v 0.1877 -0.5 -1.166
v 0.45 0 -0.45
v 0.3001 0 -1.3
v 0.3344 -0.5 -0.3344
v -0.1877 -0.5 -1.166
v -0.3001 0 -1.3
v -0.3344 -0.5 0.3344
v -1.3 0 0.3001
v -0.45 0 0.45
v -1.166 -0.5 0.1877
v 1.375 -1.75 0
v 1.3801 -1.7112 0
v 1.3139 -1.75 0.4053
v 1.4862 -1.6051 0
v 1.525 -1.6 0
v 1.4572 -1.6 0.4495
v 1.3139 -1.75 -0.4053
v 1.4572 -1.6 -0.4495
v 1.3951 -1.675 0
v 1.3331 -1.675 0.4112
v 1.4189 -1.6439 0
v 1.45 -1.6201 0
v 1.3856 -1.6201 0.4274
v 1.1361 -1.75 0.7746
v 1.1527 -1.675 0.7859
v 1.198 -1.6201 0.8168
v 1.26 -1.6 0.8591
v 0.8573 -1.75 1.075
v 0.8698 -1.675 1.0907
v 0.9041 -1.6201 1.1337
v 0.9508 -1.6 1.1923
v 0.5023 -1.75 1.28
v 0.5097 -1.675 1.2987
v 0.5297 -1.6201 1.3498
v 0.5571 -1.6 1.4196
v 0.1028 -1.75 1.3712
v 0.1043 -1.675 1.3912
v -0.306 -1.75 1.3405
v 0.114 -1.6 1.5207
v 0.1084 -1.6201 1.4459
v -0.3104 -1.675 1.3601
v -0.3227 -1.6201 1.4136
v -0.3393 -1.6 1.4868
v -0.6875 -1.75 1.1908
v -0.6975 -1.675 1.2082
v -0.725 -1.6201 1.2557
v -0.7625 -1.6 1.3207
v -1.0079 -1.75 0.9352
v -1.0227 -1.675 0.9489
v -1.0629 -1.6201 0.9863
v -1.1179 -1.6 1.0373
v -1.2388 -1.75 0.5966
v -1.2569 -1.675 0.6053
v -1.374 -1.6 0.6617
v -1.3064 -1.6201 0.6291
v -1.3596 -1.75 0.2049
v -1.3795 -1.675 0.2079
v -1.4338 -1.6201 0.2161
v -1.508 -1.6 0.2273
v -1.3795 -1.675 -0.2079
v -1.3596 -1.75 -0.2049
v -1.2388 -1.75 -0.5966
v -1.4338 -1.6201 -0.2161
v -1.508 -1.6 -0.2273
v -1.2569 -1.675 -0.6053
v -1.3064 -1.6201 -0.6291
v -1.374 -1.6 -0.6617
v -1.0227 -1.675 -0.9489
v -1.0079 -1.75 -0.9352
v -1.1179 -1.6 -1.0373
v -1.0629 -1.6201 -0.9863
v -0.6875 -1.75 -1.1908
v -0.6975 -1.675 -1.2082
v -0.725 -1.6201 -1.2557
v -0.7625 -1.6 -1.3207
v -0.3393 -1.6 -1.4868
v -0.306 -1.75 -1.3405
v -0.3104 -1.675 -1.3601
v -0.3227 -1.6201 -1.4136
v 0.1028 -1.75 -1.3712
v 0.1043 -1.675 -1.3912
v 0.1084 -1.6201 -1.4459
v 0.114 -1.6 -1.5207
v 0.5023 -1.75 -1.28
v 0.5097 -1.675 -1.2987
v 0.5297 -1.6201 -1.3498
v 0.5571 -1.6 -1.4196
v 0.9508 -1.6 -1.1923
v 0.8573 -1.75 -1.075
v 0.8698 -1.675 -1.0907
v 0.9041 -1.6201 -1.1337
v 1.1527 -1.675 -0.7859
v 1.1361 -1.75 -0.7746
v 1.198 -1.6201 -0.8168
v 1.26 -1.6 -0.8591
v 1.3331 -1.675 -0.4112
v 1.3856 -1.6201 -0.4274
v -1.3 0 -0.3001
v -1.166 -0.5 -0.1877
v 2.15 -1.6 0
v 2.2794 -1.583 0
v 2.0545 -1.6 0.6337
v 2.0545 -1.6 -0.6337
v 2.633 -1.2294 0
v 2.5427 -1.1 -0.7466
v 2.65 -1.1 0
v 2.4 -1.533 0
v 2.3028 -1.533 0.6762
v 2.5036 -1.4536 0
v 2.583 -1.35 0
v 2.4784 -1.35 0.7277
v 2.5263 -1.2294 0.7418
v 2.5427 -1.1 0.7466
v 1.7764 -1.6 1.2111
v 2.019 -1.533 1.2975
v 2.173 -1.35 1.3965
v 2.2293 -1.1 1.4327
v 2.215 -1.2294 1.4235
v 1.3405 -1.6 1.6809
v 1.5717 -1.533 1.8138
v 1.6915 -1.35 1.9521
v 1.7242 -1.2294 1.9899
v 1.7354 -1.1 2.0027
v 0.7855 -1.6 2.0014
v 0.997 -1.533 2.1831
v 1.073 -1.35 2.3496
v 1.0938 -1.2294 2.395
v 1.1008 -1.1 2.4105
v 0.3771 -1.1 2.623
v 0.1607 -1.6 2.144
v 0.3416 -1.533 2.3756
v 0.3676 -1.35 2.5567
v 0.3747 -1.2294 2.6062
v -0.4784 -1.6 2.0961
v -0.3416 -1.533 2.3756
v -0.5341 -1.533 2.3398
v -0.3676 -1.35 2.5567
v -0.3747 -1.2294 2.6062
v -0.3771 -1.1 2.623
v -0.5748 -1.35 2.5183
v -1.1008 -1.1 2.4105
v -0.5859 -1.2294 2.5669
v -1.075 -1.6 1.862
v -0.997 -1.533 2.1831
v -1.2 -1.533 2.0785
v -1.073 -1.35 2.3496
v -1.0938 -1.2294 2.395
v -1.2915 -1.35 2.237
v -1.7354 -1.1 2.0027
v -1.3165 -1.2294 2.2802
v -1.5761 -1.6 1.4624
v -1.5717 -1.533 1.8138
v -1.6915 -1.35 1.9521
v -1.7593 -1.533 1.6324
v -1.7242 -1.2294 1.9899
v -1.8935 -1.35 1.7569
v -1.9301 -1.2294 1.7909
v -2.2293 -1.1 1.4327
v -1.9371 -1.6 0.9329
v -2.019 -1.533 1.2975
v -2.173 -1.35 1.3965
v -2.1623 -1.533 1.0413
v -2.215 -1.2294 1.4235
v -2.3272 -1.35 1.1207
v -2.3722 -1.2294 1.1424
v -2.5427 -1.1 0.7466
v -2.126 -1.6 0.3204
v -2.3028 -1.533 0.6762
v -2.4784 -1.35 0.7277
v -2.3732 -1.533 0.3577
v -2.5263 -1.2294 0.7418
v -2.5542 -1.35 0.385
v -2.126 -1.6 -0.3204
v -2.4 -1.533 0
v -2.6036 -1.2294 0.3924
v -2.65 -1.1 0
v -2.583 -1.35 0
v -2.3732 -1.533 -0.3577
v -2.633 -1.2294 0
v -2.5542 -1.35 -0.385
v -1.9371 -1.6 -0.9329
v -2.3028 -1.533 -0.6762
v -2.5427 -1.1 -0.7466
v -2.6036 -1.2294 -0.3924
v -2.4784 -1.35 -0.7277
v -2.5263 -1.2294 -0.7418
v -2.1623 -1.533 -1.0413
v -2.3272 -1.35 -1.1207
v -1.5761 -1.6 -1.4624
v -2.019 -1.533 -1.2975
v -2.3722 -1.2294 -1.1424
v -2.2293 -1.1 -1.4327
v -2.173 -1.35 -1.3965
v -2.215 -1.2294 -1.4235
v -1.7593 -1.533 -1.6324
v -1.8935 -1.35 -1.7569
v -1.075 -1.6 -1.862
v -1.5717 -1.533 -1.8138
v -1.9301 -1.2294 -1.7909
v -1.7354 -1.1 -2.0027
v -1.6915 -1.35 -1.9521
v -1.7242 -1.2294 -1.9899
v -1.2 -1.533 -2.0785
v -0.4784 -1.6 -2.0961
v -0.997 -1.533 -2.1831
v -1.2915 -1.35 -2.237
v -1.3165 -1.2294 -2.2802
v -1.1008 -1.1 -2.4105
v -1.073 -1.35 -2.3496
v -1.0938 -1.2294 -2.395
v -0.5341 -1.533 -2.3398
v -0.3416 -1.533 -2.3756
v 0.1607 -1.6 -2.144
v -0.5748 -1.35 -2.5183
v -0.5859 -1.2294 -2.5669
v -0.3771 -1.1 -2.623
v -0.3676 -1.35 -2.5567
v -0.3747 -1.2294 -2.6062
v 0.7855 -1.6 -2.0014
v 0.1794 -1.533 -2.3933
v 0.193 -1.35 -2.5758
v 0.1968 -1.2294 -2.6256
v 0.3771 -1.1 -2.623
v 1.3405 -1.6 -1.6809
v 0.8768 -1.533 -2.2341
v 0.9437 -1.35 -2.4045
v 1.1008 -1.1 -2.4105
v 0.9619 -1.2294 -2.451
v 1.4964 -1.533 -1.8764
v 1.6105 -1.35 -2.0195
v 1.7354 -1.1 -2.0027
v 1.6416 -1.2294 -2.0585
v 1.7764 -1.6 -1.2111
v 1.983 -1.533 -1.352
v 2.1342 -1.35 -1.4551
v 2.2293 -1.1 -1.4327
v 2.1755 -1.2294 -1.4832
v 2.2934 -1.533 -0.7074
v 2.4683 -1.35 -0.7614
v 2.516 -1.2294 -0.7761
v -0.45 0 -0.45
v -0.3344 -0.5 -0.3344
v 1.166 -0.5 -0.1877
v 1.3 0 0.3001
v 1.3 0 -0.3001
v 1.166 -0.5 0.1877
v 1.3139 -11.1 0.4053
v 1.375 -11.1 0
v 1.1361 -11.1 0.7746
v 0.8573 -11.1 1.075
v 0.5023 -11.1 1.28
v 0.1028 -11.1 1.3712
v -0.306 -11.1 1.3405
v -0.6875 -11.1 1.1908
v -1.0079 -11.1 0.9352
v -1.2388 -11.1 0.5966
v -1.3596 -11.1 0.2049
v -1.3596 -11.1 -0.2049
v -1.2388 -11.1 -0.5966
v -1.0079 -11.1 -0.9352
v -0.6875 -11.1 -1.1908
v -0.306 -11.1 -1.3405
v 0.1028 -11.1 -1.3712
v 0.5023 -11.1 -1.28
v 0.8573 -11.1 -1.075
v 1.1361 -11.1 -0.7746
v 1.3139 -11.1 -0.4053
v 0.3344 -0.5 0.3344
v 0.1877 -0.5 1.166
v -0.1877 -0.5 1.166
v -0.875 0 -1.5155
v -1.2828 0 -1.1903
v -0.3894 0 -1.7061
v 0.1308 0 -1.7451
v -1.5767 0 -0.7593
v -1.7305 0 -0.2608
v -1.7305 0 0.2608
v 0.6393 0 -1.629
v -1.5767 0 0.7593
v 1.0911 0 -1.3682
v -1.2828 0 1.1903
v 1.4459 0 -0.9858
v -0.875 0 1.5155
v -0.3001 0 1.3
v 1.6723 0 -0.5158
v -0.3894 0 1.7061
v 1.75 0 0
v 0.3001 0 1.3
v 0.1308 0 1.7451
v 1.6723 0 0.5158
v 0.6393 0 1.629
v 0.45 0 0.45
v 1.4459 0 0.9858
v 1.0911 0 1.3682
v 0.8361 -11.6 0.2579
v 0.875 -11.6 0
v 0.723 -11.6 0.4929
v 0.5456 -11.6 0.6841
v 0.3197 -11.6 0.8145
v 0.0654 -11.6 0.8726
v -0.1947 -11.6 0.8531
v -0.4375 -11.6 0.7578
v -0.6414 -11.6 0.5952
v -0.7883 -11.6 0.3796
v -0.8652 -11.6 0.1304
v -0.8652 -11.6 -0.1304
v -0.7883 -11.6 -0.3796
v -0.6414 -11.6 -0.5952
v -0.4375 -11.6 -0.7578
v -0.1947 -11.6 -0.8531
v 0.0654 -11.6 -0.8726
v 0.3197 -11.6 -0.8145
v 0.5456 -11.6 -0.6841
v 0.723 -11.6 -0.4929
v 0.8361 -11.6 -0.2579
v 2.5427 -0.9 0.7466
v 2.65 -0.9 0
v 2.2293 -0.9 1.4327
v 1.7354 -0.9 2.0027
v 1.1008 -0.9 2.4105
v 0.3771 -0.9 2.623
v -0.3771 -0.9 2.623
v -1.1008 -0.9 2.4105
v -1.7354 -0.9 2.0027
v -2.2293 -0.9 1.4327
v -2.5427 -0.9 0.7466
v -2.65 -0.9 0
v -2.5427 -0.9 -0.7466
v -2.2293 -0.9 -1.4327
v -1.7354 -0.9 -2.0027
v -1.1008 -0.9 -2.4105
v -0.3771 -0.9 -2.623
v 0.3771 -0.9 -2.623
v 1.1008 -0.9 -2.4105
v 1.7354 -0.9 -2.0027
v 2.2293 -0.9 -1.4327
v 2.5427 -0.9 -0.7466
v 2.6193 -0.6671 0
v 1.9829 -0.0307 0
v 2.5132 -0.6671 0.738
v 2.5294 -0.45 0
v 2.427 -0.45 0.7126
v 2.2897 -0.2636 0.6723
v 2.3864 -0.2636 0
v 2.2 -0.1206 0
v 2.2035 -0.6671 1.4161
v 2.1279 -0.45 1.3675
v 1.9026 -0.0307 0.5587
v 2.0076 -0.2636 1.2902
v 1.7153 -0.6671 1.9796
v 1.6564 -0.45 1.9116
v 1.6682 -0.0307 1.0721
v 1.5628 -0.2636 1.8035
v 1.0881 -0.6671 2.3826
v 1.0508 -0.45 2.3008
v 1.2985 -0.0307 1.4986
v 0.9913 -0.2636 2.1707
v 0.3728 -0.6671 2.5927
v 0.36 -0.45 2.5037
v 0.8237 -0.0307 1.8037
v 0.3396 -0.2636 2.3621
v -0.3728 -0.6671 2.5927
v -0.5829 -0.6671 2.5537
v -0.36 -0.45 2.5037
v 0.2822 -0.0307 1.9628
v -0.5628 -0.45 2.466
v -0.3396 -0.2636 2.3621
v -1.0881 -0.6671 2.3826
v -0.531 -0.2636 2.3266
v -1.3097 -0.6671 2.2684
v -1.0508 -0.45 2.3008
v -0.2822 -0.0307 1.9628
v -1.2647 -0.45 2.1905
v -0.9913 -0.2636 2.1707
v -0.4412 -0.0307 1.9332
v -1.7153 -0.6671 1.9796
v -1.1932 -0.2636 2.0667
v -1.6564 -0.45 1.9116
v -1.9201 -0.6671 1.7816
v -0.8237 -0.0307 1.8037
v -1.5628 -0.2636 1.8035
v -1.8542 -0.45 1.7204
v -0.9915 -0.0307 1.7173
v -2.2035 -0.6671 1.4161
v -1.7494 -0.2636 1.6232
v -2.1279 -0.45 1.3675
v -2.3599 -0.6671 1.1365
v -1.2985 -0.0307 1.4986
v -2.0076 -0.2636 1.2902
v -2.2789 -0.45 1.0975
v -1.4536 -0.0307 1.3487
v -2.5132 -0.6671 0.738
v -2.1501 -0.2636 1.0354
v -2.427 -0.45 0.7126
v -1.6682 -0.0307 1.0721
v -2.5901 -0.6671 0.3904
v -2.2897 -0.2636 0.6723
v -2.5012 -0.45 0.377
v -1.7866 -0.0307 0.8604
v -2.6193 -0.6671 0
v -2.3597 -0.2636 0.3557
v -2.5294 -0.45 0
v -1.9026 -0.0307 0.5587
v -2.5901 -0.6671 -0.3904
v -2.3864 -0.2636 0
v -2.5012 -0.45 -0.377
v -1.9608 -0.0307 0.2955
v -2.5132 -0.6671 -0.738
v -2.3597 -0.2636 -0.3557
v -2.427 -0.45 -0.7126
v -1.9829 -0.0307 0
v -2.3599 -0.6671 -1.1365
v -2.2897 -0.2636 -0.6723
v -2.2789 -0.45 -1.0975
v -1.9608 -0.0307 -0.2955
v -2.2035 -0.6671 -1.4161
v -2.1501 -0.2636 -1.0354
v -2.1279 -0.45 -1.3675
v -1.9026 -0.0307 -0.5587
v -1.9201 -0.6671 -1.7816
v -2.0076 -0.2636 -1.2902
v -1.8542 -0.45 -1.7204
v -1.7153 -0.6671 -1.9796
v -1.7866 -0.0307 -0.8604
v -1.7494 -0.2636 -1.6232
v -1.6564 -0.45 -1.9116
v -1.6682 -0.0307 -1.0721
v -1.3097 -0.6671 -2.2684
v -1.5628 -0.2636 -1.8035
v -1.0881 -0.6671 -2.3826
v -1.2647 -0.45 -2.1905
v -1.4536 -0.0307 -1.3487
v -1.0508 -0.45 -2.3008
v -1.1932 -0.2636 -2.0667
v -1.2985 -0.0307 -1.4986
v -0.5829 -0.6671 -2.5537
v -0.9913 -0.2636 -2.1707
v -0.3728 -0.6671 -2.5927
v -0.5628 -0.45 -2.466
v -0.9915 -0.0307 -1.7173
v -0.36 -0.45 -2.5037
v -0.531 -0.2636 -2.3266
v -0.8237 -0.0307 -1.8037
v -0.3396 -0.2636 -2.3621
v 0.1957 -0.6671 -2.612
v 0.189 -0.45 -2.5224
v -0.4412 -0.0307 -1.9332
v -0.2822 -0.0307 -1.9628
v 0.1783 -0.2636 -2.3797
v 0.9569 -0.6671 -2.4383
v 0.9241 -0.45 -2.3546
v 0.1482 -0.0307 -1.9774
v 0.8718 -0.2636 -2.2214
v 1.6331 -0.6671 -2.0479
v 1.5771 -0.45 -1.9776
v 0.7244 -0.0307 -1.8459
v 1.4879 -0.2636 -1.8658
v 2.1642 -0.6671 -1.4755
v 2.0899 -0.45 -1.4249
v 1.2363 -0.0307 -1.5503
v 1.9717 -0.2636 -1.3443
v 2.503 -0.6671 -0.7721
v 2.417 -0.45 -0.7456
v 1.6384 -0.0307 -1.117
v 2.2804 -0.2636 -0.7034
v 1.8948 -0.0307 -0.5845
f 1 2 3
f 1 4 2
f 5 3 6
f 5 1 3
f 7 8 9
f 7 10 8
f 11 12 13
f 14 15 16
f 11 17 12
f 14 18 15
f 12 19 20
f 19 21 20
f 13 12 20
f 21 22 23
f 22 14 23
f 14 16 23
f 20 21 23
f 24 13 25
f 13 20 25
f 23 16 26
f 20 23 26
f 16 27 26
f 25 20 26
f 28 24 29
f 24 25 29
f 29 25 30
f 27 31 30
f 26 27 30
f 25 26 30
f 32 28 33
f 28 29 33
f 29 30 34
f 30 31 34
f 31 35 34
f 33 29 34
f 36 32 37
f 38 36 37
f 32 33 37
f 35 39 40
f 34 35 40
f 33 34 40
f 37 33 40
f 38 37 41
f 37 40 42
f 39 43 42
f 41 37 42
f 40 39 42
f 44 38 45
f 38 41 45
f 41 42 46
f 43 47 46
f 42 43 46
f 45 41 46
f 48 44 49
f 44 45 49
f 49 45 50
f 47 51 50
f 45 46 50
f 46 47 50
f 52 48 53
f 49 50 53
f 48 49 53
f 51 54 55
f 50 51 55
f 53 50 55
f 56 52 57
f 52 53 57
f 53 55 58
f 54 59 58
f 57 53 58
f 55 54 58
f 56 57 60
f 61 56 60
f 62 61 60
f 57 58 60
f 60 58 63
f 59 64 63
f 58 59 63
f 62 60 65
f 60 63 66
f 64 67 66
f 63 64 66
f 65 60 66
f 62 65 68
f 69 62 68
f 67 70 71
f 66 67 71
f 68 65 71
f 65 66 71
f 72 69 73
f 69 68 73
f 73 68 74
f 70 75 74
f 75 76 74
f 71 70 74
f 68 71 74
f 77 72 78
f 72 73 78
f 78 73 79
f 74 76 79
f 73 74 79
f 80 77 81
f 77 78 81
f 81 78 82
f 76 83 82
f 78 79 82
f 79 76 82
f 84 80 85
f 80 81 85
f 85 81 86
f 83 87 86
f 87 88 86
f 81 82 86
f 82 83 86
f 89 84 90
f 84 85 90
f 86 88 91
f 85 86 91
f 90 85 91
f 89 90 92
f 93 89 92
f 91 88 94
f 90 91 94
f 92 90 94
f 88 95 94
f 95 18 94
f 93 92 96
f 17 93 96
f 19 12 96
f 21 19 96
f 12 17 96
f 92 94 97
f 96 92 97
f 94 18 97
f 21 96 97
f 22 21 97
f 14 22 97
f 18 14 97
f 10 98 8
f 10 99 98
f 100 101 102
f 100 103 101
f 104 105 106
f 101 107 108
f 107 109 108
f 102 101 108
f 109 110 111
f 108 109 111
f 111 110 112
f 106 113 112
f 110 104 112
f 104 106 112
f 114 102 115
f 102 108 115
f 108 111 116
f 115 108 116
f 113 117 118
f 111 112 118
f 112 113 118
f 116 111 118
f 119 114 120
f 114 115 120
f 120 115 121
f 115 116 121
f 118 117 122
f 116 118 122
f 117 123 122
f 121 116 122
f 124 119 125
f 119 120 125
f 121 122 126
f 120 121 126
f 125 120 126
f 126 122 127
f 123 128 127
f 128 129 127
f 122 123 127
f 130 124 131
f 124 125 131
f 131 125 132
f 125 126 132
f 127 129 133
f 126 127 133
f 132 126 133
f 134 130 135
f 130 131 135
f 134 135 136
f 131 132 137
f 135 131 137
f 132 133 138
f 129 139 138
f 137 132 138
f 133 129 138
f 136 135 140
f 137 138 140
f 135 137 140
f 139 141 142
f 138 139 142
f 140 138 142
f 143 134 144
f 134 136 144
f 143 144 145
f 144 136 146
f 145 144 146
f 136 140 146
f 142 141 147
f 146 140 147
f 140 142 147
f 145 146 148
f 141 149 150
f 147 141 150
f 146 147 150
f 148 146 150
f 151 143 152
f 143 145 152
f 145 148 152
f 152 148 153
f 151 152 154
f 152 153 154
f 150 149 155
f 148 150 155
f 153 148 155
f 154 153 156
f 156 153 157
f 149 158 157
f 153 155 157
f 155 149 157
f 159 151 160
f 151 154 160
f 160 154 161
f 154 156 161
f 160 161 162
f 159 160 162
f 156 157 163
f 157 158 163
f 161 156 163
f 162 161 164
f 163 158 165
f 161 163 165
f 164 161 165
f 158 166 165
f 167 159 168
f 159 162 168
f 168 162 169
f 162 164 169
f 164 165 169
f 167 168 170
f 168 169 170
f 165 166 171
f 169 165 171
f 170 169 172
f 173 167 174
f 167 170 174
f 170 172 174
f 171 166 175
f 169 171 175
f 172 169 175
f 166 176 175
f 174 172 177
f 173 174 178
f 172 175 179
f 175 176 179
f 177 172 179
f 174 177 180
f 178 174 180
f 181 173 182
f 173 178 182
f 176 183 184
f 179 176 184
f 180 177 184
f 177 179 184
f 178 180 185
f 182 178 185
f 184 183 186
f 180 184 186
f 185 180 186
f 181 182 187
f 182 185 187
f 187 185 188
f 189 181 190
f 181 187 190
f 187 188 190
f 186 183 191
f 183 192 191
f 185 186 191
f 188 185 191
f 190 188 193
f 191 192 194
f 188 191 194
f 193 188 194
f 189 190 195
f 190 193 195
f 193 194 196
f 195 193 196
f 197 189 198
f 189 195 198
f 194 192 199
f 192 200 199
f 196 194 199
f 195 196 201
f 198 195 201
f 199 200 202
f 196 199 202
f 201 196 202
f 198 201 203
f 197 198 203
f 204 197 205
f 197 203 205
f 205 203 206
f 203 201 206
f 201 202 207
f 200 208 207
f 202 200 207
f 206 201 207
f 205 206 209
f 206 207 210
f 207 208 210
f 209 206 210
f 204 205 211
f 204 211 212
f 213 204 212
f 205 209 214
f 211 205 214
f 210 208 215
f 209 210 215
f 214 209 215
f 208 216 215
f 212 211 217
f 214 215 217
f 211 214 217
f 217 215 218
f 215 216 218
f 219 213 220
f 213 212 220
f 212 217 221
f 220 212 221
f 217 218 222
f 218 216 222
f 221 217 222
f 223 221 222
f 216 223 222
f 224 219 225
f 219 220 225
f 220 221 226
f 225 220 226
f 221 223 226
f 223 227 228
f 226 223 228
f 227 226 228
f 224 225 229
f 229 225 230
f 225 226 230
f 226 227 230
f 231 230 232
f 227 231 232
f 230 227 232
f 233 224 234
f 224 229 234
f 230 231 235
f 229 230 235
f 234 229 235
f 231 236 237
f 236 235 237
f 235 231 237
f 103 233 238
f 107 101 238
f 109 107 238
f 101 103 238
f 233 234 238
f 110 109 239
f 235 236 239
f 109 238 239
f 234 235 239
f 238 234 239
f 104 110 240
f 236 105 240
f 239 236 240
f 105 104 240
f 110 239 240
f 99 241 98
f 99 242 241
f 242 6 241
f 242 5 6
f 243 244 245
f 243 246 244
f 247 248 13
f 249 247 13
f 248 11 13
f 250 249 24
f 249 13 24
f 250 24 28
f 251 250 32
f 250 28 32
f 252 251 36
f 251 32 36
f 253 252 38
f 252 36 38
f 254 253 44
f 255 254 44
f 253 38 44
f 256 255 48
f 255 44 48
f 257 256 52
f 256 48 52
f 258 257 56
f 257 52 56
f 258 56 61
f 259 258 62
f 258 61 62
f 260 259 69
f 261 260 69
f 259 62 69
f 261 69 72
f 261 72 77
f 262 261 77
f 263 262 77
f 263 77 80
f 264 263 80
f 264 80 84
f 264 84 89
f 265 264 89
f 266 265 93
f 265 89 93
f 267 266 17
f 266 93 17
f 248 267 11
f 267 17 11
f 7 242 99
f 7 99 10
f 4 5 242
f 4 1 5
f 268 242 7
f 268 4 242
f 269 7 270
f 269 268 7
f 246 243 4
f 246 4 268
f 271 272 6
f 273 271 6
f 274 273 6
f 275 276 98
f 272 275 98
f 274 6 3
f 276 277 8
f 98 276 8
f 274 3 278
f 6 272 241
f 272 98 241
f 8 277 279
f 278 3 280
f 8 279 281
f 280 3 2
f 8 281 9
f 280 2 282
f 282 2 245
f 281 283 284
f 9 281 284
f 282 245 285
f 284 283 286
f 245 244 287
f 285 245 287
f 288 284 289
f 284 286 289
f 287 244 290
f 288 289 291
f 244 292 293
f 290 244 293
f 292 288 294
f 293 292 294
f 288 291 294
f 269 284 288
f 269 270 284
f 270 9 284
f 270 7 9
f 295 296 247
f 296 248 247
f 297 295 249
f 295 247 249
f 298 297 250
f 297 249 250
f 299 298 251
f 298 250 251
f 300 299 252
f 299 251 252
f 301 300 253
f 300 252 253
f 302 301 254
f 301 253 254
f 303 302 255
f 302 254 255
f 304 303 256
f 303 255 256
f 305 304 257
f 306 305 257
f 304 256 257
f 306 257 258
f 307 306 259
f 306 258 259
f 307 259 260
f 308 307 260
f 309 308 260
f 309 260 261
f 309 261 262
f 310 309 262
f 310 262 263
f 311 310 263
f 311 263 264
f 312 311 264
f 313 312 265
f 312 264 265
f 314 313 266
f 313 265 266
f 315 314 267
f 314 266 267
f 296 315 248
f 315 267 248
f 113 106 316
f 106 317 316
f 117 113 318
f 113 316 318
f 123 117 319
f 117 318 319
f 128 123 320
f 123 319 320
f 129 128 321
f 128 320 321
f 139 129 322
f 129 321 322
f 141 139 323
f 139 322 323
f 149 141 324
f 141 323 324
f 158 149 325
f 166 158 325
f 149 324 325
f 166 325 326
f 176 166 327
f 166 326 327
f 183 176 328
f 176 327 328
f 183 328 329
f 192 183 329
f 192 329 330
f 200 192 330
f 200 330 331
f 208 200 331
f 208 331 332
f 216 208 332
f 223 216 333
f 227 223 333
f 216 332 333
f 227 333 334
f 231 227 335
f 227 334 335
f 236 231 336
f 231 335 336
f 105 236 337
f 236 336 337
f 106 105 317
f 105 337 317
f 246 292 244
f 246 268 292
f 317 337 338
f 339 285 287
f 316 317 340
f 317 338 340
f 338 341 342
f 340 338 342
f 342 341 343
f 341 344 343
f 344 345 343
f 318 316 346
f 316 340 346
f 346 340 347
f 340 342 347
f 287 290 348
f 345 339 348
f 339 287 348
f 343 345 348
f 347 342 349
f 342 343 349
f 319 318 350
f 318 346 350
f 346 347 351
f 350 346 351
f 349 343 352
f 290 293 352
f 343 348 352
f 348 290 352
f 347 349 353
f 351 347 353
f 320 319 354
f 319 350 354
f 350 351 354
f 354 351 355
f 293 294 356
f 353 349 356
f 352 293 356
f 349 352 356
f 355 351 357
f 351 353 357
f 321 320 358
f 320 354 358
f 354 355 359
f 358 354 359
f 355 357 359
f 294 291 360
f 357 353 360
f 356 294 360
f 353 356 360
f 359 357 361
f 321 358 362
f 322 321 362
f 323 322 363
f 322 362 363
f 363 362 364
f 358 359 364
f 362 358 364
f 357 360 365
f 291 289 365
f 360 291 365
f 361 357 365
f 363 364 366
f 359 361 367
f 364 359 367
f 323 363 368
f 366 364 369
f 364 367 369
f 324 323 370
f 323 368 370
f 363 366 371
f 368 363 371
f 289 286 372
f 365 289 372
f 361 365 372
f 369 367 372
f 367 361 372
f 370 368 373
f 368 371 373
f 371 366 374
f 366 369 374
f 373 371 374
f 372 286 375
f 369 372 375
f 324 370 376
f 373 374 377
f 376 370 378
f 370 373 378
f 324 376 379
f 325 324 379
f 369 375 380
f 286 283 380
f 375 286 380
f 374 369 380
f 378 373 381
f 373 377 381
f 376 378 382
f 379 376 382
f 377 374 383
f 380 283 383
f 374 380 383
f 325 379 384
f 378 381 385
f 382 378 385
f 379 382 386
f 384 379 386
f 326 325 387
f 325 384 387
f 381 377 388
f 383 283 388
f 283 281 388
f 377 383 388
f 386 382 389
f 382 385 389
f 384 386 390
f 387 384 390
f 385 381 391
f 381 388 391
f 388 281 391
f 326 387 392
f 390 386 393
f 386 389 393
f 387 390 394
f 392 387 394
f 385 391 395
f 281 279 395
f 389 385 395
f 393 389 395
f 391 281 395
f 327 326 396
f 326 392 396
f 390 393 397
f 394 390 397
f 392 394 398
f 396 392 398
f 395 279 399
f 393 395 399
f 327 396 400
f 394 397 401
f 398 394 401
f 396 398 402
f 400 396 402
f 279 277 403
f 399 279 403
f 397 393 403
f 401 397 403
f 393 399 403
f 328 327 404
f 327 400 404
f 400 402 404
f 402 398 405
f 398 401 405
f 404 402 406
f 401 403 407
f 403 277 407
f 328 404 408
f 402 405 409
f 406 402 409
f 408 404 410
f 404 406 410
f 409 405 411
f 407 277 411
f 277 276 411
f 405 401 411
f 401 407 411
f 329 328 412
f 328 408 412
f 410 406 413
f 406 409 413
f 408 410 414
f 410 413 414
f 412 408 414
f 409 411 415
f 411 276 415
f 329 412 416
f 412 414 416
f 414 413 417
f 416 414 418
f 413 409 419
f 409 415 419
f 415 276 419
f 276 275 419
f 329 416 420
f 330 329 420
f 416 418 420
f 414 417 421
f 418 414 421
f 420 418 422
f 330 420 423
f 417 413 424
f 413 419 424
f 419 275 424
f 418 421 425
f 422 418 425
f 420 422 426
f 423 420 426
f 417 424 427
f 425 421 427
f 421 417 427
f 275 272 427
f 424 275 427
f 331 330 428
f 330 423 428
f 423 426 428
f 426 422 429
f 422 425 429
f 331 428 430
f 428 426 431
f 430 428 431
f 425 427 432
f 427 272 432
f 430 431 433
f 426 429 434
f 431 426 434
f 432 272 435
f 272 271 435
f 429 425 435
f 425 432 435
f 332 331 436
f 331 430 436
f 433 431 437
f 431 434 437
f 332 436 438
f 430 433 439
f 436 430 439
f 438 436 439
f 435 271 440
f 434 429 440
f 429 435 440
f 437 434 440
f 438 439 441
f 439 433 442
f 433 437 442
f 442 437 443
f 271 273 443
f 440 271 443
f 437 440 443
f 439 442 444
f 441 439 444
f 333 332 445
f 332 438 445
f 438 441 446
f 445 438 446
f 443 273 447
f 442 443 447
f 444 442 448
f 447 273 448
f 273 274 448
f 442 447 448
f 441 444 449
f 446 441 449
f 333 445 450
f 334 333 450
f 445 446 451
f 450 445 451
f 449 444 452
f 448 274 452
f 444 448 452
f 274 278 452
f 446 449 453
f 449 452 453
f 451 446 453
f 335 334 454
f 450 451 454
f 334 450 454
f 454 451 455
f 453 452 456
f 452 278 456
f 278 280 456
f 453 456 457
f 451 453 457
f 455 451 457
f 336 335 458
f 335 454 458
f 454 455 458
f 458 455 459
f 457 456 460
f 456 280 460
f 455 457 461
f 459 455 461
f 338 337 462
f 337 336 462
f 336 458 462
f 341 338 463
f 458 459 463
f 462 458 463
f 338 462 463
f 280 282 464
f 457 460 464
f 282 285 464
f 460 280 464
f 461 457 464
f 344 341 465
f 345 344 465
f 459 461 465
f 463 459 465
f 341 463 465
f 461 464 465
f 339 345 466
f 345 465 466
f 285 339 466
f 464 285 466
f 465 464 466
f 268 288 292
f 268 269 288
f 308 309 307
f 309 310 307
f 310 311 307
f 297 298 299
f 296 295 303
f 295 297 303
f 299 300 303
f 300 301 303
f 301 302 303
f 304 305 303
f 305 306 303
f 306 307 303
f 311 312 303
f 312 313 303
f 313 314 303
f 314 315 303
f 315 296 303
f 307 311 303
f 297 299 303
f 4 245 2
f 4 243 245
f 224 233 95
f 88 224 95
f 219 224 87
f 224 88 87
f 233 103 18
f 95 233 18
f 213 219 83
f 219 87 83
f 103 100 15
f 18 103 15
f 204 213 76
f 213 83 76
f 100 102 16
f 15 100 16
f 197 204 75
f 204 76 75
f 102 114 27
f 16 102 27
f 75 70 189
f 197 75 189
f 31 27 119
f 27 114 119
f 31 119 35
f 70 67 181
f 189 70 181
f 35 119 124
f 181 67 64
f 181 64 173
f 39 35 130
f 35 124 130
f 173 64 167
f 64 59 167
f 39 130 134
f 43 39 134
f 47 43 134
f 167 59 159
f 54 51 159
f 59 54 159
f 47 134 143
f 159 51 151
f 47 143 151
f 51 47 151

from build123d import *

# Parameters (mm, degrees)
CUT_EXTRUDE1_DEPTH = 0.5
CUT_EXTRUDE1_TAPER = 15


with BuildPart() as part:
    # Sketch1 → Revolve1 (revolve)
    with BuildSketch(Plane.XY):
        with BuildLine():
            Line((0, -11.6), (0.875, -11.6))
            Line((0.875, -11.6), (1.375, -11.1))
            Line((1.375, -11.1), (1.375, -1.75))
            ThreePointArc((1.375, -1.75), (1.418933983, -1.643933983), (1.525, -1.6))
            Line((1.525, -1.6), (2.15, -1.6))
            ThreePointArc((2.15, -1.6), (2.503553391, -1.453553391), (2.65, -1.1))
            Line((2.65, -1.1), (2.65, -0.9))
            ThreePointArc((2.65, -0.9), (2.386396103, -0.263603897), (1.75, 0))
            Line((1.75, 0), (0, 0))
            Line((0, 0), (0, -11.6))
        make_face()
    revolve(axis=Axis((0, 0, 0), (0, -1, 0)))

    # Sketch2 → Cut-Extrude1 (cut)
    with BuildSketch(Plane(origin=(0, 0, 0), x_dir=(1, 0, 0), z_dir=(0, 1, 0))):
        Polygon((-0.300122066, 1.3), (-0.45, 0.45), (-1.3, 0.300122066), (-1.3, -0.300122066), (-0.45, -0.45), (-0.300122066, -1.3), (0.300122066, -1.3), (0.45, -0.45), (1.3, -0.300122066), (1.3, 0.300122066), (0.45, 0.45), (0.300122066, 1.3), align=None)
    extrude(amount=-CUT_EXTRUDE1_DEPTH, taper=CUT_EXTRUDE1_TAPER, mode=Mode.SUBTRACT)


solid = part.part
